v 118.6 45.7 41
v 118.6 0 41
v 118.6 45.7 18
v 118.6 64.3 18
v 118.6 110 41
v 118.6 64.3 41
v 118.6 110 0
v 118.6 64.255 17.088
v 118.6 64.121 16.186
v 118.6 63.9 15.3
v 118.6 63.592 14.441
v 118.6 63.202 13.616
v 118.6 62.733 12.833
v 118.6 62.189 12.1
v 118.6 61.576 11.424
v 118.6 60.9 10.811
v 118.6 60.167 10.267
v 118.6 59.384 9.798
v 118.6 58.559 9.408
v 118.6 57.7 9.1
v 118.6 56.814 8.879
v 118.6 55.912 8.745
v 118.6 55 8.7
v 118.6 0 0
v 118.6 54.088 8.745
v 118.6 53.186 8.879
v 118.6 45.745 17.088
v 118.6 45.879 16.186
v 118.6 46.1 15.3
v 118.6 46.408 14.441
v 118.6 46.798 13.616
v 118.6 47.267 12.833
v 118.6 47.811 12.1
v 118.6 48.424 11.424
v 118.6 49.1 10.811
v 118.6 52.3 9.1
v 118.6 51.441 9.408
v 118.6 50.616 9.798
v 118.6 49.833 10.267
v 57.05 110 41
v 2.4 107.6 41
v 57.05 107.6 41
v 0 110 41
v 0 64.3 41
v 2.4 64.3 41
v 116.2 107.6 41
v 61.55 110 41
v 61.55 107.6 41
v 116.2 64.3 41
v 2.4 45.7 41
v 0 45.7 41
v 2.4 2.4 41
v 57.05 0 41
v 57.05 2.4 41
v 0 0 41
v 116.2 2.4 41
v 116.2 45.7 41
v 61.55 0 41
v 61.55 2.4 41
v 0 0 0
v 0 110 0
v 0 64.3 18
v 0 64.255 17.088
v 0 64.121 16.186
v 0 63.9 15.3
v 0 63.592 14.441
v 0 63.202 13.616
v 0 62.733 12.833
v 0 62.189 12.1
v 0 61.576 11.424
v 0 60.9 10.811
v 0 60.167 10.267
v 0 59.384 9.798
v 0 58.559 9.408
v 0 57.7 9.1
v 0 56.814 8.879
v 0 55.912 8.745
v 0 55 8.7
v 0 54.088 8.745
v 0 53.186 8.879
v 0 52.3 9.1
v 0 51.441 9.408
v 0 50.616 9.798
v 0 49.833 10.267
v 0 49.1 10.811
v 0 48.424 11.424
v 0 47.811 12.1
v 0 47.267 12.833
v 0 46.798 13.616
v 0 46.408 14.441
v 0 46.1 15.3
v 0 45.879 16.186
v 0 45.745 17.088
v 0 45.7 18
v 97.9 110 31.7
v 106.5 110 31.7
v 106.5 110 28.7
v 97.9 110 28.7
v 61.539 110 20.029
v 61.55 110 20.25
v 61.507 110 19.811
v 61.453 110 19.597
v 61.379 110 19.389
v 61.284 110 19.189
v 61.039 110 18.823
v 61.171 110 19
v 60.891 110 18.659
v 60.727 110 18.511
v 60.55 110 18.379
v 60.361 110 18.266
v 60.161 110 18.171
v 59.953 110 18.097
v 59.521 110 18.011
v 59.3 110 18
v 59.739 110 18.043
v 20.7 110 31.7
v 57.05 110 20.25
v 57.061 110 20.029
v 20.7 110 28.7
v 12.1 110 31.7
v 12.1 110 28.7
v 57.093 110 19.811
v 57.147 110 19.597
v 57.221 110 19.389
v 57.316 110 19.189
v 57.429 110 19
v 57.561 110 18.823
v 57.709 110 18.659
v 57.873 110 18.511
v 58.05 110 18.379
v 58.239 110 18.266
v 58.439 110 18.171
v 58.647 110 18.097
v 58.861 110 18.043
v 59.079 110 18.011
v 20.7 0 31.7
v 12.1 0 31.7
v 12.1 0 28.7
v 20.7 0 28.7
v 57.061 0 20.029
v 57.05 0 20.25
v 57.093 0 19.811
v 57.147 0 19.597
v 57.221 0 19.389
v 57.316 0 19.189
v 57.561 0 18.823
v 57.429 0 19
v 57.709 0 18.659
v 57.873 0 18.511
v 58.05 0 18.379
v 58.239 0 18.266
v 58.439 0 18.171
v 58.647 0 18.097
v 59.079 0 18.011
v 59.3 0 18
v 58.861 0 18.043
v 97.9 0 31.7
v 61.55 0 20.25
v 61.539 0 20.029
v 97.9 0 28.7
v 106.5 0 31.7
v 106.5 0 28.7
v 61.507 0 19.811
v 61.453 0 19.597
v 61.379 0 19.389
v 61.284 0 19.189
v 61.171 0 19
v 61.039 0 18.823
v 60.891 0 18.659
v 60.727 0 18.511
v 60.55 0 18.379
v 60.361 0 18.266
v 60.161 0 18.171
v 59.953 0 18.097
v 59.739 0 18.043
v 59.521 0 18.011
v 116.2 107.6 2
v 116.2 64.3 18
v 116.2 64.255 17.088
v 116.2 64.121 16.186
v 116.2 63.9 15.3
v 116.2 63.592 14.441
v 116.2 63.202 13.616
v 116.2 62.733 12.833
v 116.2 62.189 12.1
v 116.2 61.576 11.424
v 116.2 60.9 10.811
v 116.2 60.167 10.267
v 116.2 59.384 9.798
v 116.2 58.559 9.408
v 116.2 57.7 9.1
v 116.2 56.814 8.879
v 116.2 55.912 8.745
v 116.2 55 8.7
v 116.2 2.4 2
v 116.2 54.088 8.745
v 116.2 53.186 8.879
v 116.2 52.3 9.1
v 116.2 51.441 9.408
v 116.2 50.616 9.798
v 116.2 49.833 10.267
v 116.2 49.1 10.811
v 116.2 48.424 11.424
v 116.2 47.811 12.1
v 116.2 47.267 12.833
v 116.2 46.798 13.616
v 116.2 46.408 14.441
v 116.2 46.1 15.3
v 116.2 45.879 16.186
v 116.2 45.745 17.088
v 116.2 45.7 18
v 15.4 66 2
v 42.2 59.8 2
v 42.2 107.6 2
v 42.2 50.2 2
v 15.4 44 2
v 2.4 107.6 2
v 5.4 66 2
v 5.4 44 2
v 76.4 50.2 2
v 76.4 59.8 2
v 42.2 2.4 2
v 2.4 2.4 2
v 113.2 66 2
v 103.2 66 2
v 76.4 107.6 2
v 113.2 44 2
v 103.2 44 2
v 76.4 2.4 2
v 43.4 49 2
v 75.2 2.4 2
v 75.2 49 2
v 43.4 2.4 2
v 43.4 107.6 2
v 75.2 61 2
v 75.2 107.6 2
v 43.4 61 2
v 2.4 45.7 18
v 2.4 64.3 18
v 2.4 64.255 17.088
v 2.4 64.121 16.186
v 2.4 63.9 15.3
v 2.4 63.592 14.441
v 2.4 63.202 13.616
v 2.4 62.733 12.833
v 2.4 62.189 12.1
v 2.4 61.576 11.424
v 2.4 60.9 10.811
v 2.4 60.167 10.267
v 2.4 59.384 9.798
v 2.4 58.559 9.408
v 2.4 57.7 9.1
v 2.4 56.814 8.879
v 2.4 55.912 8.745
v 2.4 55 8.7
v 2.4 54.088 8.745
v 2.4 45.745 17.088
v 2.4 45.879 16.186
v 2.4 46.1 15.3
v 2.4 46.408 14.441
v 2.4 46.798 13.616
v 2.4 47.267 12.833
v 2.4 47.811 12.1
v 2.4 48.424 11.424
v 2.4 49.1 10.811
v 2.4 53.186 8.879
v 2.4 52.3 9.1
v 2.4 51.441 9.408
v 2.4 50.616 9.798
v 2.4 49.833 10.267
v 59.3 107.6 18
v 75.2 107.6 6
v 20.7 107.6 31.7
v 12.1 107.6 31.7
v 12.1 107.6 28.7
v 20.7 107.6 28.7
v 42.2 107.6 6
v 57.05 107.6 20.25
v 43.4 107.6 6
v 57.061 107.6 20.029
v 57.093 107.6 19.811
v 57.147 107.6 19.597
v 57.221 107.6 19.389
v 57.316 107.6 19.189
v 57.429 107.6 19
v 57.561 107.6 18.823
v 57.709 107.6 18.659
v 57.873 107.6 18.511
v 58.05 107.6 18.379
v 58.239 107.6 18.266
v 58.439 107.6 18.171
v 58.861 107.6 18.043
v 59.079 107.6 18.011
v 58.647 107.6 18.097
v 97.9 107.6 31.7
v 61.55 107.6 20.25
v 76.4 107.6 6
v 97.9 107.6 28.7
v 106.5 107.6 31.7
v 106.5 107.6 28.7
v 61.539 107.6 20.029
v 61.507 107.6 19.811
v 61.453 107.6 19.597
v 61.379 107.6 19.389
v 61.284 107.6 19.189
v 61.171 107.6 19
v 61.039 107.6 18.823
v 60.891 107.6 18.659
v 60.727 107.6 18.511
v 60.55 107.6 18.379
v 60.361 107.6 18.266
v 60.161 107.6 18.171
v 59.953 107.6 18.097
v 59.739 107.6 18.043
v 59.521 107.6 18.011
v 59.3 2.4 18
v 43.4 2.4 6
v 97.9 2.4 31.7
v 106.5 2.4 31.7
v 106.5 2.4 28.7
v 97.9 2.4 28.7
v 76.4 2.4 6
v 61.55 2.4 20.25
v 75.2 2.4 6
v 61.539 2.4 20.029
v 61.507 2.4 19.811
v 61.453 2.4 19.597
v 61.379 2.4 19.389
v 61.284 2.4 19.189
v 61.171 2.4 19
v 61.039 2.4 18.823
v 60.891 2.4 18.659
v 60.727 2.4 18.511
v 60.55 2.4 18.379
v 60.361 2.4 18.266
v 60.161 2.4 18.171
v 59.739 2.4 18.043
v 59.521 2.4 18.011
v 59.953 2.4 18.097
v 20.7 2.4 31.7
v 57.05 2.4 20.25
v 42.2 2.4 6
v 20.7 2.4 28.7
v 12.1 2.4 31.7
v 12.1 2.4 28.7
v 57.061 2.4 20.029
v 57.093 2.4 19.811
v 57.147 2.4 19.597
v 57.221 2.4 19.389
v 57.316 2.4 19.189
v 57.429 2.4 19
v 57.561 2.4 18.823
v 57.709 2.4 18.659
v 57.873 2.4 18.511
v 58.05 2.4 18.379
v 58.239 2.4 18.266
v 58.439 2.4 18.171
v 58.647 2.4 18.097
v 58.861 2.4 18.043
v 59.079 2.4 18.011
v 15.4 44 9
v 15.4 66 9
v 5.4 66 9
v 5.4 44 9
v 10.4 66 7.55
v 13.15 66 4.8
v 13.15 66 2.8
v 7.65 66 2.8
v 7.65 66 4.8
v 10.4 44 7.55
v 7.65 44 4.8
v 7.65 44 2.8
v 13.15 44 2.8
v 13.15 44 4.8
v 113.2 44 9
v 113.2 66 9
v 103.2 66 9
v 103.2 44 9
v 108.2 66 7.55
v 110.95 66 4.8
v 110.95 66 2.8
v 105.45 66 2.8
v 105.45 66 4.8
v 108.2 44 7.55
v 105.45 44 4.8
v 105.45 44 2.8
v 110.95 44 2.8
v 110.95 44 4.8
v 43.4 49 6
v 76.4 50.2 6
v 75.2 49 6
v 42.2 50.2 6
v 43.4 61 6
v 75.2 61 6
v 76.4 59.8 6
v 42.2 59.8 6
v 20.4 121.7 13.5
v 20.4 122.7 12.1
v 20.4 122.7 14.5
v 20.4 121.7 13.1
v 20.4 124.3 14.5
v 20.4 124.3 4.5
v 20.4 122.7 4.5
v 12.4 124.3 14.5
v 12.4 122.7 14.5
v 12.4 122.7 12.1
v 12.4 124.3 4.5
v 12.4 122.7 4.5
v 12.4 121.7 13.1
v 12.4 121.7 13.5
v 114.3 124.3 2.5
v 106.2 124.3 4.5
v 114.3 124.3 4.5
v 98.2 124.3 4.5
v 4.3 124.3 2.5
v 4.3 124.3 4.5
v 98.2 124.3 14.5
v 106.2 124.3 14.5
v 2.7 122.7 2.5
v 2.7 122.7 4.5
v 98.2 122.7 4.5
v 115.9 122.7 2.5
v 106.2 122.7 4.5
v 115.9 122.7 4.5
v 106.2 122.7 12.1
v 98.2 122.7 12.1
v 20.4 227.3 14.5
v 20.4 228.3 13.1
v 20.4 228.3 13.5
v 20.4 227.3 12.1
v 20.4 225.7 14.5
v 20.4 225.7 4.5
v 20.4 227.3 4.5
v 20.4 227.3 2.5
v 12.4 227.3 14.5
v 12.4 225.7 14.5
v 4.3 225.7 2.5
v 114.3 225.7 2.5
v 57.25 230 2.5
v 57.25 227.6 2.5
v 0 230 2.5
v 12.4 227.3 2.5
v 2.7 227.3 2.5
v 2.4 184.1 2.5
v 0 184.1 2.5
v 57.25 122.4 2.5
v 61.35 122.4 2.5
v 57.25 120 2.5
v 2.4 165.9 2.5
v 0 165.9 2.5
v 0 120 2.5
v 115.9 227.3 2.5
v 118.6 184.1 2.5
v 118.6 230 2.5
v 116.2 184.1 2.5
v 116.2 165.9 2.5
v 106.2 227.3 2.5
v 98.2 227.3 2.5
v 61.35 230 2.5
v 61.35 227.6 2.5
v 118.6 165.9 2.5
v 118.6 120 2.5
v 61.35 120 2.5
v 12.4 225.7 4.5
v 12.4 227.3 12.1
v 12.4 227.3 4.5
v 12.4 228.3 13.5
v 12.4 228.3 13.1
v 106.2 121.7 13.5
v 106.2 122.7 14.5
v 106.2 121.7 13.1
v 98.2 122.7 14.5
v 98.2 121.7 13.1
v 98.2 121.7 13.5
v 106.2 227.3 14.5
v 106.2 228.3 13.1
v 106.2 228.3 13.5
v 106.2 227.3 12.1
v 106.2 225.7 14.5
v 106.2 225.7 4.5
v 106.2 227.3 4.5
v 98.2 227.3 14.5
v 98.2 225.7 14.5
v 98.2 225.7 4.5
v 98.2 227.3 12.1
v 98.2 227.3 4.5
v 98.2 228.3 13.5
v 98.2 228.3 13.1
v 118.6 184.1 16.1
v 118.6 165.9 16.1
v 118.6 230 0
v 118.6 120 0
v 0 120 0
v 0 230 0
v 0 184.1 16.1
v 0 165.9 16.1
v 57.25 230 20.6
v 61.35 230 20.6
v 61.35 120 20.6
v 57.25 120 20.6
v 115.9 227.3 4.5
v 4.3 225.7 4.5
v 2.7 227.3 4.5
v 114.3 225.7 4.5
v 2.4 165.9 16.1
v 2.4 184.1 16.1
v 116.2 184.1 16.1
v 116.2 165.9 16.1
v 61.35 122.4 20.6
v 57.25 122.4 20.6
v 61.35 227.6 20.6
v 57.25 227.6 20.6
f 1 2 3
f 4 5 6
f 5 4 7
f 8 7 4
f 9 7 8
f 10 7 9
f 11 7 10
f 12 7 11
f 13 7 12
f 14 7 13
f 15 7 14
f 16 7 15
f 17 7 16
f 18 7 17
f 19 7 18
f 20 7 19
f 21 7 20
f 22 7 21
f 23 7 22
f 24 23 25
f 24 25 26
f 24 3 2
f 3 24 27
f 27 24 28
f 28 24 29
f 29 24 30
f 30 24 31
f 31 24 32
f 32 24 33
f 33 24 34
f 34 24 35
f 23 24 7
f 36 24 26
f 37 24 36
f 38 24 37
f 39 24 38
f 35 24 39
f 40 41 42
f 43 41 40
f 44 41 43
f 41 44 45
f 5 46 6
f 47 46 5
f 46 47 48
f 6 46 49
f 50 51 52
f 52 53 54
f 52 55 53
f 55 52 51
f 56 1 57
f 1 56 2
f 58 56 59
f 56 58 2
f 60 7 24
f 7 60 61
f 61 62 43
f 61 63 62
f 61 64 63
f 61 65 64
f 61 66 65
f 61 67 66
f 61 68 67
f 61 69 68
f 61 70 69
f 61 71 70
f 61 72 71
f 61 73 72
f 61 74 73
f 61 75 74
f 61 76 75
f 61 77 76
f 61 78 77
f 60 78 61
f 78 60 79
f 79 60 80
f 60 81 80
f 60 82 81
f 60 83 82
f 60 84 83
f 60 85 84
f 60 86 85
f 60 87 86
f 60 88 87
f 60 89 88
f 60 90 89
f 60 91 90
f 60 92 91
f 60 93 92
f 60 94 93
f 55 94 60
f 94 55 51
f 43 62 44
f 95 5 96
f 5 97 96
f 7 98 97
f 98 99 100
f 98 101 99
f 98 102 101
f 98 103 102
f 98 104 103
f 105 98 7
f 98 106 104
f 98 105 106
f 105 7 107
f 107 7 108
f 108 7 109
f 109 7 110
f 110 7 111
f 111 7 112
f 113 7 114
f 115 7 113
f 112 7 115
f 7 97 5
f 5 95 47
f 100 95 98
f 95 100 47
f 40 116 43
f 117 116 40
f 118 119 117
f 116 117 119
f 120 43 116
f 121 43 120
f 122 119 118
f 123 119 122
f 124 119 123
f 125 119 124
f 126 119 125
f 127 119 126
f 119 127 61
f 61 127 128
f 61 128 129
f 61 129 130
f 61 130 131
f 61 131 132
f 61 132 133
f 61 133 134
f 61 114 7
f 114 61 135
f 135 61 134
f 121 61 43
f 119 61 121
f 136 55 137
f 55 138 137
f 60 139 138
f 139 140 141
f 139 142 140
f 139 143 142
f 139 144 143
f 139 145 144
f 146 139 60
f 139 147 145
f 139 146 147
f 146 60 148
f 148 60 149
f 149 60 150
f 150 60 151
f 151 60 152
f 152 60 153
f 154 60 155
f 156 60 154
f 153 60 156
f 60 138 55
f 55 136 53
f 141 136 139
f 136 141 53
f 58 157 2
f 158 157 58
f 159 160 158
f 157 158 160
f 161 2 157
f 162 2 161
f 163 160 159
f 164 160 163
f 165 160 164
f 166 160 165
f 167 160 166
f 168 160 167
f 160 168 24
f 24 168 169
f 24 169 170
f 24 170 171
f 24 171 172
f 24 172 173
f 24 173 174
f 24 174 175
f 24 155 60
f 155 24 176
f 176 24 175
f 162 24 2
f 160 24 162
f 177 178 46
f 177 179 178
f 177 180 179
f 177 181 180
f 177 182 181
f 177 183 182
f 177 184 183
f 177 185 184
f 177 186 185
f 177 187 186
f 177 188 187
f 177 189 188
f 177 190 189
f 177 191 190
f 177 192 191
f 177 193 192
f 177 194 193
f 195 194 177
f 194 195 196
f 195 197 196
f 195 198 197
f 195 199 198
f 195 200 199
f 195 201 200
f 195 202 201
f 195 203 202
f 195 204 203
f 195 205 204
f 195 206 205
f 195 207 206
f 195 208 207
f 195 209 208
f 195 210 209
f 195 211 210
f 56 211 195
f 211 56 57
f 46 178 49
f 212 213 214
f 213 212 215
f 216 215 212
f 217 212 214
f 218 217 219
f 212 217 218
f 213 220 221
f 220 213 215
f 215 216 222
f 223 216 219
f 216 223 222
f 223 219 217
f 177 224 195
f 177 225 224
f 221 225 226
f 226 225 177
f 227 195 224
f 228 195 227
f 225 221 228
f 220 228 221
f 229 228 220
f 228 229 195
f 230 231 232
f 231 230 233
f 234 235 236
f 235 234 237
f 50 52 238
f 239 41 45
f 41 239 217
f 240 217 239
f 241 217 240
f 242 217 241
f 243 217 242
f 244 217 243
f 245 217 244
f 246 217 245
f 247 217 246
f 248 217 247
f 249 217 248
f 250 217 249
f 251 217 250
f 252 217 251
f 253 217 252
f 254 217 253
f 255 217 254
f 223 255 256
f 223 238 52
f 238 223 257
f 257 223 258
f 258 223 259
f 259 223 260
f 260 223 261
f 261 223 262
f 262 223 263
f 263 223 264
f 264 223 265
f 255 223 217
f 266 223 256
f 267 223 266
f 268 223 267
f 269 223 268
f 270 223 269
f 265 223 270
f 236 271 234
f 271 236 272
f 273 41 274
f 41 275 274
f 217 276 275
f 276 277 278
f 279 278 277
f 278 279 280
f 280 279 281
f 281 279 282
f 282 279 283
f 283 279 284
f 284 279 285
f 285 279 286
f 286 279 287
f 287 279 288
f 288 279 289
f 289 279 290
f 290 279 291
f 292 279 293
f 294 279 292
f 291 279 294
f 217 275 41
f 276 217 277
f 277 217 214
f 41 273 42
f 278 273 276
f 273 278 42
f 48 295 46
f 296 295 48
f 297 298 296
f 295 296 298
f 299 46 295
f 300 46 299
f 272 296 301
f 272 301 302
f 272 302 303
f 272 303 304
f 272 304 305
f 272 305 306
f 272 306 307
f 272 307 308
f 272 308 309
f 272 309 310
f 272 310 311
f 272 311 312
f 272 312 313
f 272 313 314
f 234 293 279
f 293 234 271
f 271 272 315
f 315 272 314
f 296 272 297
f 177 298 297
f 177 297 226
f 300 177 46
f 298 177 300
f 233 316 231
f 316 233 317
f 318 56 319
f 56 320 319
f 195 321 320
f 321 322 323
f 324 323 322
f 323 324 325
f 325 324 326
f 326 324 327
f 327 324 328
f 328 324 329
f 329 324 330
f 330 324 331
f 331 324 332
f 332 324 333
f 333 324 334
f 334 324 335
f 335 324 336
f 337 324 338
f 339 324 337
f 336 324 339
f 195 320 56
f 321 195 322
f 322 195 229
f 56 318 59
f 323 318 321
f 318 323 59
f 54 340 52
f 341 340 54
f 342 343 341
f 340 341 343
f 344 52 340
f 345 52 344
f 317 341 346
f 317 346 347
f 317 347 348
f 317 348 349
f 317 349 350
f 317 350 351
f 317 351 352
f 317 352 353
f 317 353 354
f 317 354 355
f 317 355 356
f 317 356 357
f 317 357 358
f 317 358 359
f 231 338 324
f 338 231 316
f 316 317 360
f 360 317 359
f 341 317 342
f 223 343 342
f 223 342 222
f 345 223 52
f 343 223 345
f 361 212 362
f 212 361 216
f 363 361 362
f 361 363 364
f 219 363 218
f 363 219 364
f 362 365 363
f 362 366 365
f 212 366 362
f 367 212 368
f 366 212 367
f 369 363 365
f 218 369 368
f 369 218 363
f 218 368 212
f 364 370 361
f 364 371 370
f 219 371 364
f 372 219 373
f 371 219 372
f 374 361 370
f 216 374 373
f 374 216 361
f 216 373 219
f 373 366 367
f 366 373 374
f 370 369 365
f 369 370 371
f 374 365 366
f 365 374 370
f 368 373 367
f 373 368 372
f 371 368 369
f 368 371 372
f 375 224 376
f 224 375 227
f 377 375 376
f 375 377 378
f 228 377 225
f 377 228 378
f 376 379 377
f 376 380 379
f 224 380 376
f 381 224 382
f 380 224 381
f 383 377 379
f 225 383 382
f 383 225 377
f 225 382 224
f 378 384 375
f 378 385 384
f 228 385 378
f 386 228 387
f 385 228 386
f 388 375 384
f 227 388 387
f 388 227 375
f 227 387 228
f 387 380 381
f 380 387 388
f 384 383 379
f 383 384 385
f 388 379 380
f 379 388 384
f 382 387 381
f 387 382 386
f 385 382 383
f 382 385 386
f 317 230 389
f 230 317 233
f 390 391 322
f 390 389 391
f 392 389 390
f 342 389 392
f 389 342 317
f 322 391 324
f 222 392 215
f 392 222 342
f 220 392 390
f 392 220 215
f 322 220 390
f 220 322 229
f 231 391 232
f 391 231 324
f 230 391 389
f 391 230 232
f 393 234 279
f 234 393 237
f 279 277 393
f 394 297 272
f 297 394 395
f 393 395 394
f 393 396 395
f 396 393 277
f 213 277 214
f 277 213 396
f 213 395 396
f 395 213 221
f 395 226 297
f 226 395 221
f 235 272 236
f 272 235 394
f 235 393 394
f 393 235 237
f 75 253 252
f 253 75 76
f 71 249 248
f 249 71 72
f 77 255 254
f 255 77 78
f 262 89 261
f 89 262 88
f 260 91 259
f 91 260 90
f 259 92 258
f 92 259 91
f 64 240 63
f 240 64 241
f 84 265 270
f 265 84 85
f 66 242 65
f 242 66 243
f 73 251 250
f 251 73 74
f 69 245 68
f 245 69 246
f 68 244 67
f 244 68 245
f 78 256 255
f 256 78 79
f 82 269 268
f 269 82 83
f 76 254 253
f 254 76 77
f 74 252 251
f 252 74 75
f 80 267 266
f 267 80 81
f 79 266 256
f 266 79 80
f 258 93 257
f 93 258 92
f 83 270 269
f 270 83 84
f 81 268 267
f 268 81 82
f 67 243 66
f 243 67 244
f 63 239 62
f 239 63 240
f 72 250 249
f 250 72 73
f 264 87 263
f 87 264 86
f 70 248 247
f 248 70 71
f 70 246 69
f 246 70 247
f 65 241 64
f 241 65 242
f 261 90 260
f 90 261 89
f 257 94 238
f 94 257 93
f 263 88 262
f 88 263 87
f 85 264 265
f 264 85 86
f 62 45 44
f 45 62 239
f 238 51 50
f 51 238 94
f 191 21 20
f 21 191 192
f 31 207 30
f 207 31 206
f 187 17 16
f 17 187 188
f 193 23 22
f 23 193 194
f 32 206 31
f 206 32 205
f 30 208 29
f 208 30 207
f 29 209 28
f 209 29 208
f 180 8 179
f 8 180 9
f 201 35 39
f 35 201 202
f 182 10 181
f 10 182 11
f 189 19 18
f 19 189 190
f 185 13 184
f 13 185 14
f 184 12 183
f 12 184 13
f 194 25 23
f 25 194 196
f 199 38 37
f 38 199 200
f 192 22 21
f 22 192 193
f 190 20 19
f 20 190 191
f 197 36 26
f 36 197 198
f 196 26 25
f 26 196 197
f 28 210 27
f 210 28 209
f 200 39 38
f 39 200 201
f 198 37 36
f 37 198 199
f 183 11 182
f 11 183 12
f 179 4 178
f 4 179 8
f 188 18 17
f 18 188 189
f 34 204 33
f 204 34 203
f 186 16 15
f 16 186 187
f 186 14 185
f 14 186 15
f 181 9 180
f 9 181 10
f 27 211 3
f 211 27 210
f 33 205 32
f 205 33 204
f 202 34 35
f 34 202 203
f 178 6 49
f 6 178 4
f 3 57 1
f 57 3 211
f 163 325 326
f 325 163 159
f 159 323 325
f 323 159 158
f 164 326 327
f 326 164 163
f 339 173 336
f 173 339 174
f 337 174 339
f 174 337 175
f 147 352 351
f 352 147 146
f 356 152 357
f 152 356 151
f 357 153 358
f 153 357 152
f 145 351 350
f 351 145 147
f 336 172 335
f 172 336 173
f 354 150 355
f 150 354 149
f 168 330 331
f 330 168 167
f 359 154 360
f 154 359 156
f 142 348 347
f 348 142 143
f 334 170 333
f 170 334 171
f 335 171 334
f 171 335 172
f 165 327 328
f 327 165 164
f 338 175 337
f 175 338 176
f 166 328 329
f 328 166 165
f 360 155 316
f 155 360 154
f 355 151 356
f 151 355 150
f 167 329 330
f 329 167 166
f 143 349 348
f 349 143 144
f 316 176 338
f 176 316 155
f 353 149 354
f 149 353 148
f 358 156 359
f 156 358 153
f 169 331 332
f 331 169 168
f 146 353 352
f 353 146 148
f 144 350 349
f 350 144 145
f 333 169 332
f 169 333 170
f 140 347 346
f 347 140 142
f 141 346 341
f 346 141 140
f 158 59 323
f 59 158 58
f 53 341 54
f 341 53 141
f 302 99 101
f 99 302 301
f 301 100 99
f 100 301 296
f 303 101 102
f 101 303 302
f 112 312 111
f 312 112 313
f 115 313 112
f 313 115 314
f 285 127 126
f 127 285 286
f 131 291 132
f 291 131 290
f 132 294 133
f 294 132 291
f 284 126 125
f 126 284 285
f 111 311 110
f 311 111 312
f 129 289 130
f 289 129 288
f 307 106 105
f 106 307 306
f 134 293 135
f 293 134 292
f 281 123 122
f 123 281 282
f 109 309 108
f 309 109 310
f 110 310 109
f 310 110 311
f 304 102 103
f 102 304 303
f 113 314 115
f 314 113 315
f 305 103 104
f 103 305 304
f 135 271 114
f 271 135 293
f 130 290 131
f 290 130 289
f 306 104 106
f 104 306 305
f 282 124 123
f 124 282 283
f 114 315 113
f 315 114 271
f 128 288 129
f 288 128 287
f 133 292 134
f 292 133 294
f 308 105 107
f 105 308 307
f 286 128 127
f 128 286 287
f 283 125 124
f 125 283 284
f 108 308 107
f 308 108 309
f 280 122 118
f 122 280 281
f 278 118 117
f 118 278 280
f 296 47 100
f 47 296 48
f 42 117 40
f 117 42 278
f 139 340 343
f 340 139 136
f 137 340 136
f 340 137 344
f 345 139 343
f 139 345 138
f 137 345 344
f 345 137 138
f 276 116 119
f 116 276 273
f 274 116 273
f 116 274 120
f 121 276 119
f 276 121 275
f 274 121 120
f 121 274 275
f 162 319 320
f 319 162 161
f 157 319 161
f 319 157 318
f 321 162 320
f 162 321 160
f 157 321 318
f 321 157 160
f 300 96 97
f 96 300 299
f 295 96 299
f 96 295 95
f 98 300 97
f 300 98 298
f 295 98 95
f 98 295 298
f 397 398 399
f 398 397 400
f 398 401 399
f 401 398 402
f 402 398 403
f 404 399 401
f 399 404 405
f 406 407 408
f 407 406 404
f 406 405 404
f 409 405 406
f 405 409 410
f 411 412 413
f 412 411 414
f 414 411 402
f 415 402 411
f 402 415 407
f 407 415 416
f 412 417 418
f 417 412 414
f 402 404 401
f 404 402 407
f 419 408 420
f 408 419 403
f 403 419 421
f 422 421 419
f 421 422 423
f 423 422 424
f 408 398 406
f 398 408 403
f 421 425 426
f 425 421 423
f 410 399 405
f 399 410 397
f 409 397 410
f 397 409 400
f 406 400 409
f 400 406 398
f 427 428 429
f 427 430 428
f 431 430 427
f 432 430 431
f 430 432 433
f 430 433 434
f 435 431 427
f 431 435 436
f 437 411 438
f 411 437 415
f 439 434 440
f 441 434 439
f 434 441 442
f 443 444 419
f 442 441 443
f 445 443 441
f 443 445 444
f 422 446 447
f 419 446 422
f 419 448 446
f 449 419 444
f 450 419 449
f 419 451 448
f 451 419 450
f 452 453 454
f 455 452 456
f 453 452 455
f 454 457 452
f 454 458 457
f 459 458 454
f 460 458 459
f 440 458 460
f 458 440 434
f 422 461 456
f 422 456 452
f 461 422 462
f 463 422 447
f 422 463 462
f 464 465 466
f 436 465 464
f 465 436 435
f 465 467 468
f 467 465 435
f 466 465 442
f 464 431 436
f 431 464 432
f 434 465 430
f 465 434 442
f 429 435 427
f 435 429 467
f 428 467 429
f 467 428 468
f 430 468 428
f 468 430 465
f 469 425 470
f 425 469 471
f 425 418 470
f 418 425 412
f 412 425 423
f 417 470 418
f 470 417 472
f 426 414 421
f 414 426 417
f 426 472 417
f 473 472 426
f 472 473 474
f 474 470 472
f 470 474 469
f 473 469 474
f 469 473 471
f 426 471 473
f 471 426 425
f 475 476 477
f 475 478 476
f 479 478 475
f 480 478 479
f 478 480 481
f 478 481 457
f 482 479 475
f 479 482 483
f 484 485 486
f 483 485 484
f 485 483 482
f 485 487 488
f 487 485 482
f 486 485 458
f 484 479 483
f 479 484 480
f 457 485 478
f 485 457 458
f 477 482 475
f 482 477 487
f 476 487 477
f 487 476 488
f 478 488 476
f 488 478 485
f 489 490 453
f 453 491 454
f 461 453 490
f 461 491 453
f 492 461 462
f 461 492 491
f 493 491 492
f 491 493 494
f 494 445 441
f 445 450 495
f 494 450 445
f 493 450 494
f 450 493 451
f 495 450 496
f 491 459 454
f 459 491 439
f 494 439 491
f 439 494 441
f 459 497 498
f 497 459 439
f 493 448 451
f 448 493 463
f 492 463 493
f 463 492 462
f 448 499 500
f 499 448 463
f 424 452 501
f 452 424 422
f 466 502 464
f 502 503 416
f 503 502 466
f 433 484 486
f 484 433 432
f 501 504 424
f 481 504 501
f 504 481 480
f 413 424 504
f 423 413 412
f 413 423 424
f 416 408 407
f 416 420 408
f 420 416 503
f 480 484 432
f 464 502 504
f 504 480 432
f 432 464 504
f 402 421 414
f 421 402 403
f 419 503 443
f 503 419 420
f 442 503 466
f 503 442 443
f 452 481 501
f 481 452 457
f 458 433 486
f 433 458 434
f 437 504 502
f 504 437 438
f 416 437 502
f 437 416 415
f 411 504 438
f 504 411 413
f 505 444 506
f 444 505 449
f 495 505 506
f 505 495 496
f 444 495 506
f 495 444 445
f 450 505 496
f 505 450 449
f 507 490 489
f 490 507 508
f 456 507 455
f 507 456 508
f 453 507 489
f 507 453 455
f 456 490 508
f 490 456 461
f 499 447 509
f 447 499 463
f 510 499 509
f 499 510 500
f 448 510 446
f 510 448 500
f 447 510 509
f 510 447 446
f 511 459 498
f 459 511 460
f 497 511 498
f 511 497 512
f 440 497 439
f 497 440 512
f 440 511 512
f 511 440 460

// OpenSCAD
// =====================================================================
//  CT clamp box for a 10 AWG x 4C cord  —  companion to wago_junction_box
//
//  The cord passes straight through, unbroken.  Inside the box the outer
//  jacket is stripped and the two hot conductors each run through their
//  own Zemismart SDM02T-TZ split-core CT.  The CTs lie on their sides,
//  side by side across Y, lead faces against the back and front walls,
//  jaws facing the centre lane (hinge up).  Neutral + ground run down the
//  lane between the CTs.  CT leads exit through U-slots in the outer walls.
//
//  Units: mm.  Print base + lid.  PETG or ASA/ABS — NOT PLA.
//  Snap-fit lid (press the barbs in from outside to release).
//  Set  part = "base" / "lid" / "both"  then F6 + export STL.
// =====================================================================

/* [Cord] */
cord_od     = 18.0;   // measured with calipers (10/4 STW, 5 mm conductors)
cord_clear  = 0.6;    // extra on slot width

/* [CT clamps — Zemismart SDM02T-TZ 120 A split-core (drawing: 35.5 W x 45.6 H x 30.8 D, window D16)] */
ct_w       = 35.5;  // body width  -> box HEIGHT when lying on its side
ct_h       = 45.6;  // body height (lead face to jaw) -> along Y
ct_d       = 30.8;  // body depth (window axis) -> along X, conductor runs through
ct_fit     = 0.5;   // per-side pocket clearance
ct_lead_d  = 4.5;   // twin-lead OD (measured ~4 mm)
ct_lead_z  = ct_w/2;// lead exits the centre of the lead face
ct_win_y   = 12;    // window centre from the jaw end (from the drawing)
ct_lane    = 12;    // lane between the two CTs for neutral + ground
ct_top_clr = 2.5;   // headroom above the CT under the lid
fence_h    = 4.0;
fence_t    = 1.2;

/* [Box] */
wall      = 2.4;
floor_t   = 2.0;
lid_t     = 2.5;
lip_t     = 1.6;
lip_h     = 2.0;
lip_clear = 0.3;
fan_out   = 28;    // saddle -> CT: room for the hots to jog into their windows

/* [Strain relief — zip-tie saddle] */
saddle_h = 7;      // must clear tie_z + tie_h + tie_w/2 (peaked roof) by >= 1.2
saddle_x = 10;
tie_w    = 5.5;    // zip-tie tunnel width (fits a 4.8 mm tie)
tie_h    = 2.0;    // tunnel height at the straight walls; a 45 deg peak sits on top (no bridge)
tie_z    = 0.8;    // tunnel floor above saddle base

/* [Snap-fit (PETG-sized)] */
snap_n    = 2;     // hooks per long (X) side
snap_w    = 8;     // hook width (X)
snap_edge = 14;    // hook centre distance from each end wall
arm_len   = 12;    // arm length below lid underside (longer = softer snap)
barb_d    = 1.0;   // barb protrusion into the wall window
barb_h    = 2.4;   // barb height (45 deg chamfers top and bottom for printing)
win_clear = 0.3;   // window clearance around the barb, per side

/* [Output] */
part = "both"; // ["base","lid","both"]

// ---------------- derived ----------------
ct_px   = ct_d + 2*ct_fit;                 // pocket size along X
ct_py   = ct_h + 2*ct_fit;                 // pocket size along Y
inner_x = 2*(3 + saddle_x + fan_out) + ct_px;
inner_y = 2*ct_py + ct_lane;
inner_h = ct_w + 2*ct_fit + ct_top_clr;
outer_x = inner_x + 2*wall;
outer_y = inner_y + 2*wall;
rim_z   = floor_t + inner_h;
slot_w  = cord_od + cord_clear;
cord_y  = wall + inner_y/2;
cord_zb = floor_t + saddle_h;              // cord bottom
cord_zc = cord_zb + cord_od/2;             // cord centre
cord_zt = cord_zb + cord_od;               // cord top
tab_w   = slot_w - 0.4;
tab_h   = rim_z - (cord_zt + 0.4);
ct_x0   = wall + 3 + saddle_x + fan_out;   // pocket X start (fence inside face)
ct_xc   = ct_x0 + ct_px/2;                 // CT / lead-slot X centre
ct_lead_zb = floor_t + ct_fit + ct_lead_z - ct_lead_d/2;   // lead slot bottom
lead_tab_w = ct_lead_d - 0.4;
lead_tab_h = rim_z - (ct_lead_zb + ct_lead_d + 0.4);
snap_xs = [for (i=[0:snap_n-1]) wall + snap_edge + i*(outer_x - 2*(wall+snap_edge))/max(snap_n-1,1)];
$fn = 64;

module cord_slot() {                    // U-slot in the x=0 end wall, open to the top
    translate([-1, cord_y, cord_zc]) rotate([0,90,0]) cylinder(d=slot_w, h=wall+2);
    translate([-1, cord_y-slot_w/2, cord_zc]) cube([wall+2, slot_w, rim_z]);
}

module lead_slot() {                    // U-slot in the y=0 wall, centred on x=0, open to the top
    translate([0, -1, ct_lead_zb + ct_lead_d/2]) rotate([-90,0,0]) cylinder(d=ct_lead_d, h=wall+2);
    translate([-ct_lead_d/2, -1, ct_lead_zb + ct_lead_d/2]) cube([ct_lead_d, wall+2, rim_z]);
}

module saddle(x0) {
    // block with a Y-axis tunnel under the deck for a zip tie;
    // tunnel has a 45 deg peaked roof so it prints with no bridge
    sw = cord_od + 4;
    tx = (saddle_x - tie_w)/2;
    translate([x0, cord_y - sw/2, floor_t]) difference() {
        cube([saddle_x, sw, saddle_h]);
        translate([0, sw+1, 0]) rotate([90,0,0]) linear_extrude(sw+2)
            polygon([[tx, tie_z], [tx+tie_w, tie_z], [tx+tie_w, tie_z+tie_h],
                     [tx+tie_w/2, tie_z+tie_h+tie_w/2], [tx, tie_z+tie_h]]);
    }
}

// CT pocket against the y=0 wall: two side fences + a front fence (wall closes the back)
module ct_pocket() {
    translate([ct_x0-fence_t, wall, floor_t])        cube([fence_t, ct_py+fence_t, fence_h]);
    translate([ct_x0+ct_px,   wall, floor_t])        cube([fence_t, ct_py+fence_t, fence_h]);
    translate([ct_x0-fence_t, wall+ct_py, floor_t])  cube([ct_px+2*fence_t, fence_t, fence_h]);
}

module snap_windows() {
    ww = snap_w + 2*win_clear;
    wh = barb_h + 2*win_clear;
    z0 = rim_z - arm_len - win_clear;       // barb occupies the bottom barb_h of the arm
    for (x=snap_xs, y=[-1, outer_y - wall - 1])
        translate([x - ww/2, y, z0]) cube([ww, wall+2, wh]);
}

// One hook, lid print orientation, on the y=0 side; barb points toward -Y (into the wall).
module snap_hook() {
    li = wall + lip_clear;
    zt = lid_t + arm_len;
    translate([-snap_w/2, 0, 0]) {
        translate([0, li, lid_t]) cube([snap_w, lip_t, arm_len]);
        rotate([90,0,90]) linear_extrude(snap_w)
            polygon([[li, zt - barb_h], [li - barb_d, zt - barb_h + barb_d],
                     [li - barb_d, zt - barb_d], [li, zt], [li + 0.01, zt], [li + 0.01, zt - barb_h]]);
    }
}

module base() {
    difference() {
        union() {
            // shell
            difference() {
                cube([outer_x, outer_y, rim_z]);
                translate([wall, wall, floor_t]) cube([inner_x, inner_y, inner_h+1]);
            }
            // zip-tie saddles
            saddle(wall + 3);
            saddle(outer_x - wall - 3 - saddle_x);
            // CT pockets, mirrored about the box centreline
            ct_pocket();
            translate([0, outer_y, 0]) mirror([0,1,0]) ct_pocket();
        }
        // cord entries
        cord_slot();
        translate([outer_x - wall, 0, 0]) cord_slot();
        // CT lead slots through the back and front walls
        translate([ct_xc, 0, 0]) lead_slot();
        translate([ct_xc, outer_y, 0]) mirror([0,1,0]) lead_slot();
        // snap windows through both long walls
        snap_windows();
    }
}

module lid() {   // modelled in PRINT orientation: plate on bed, lip/tabs/hooks up
    li = wall + lip_clear;
    union() {
        cube([outer_x, outer_y, lid_t]);
        // continuous alignment lip
        translate([li, li, lid_t])                     cube([outer_x-2*li, lip_t, lip_h]);
        translate([li, outer_y-li-lip_t, lid_t])       cube([outer_x-2*li, lip_t, lip_h]);
        translate([li, li, lid_t])                     cube([lip_t, outer_y-2*li, lip_h]);
        translate([outer_x-li-lip_t, li, lid_t])       cube([lip_t, outer_y-2*li, lip_h]);
        // tabs that drop into the cord slots and sit just above the cord
        translate([0,            cord_y-tab_w/2, lid_t]) cube([wall, tab_w, tab_h]);
        translate([outer_x-wall, cord_y-tab_w/2, lid_t]) cube([wall, tab_w, tab_h]);
        // tabs that close the CT lead slots above the lead
        translate([ct_xc-lead_tab_w/2, 0,            lid_t]) cube([lead_tab_w, wall, lead_tab_h]);
        translate([ct_xc-lead_tab_w/2, outer_y-wall, lid_t]) cube([lead_tab_w, wall, lead_tab_h]);
        // snap hooks on both long sides
        for (x=snap_xs) {
            translate([x, 0, 0]) snap_hook();
            translate([x, outer_y, 0]) mirror([0,1,0]) snap_hook();
        }
    }
}

if (part == "base" || part == "both") base();
if (part == "lid"  || part == "both") translate([0, outer_y + 10, 0]) lid();

echo(str("CT box: ", outer_x, " x ", outer_y, " mm; base height ", rim_z, " mm; lid ", lid_t + max(lip_h, tab_h, arm_len, lead_tab_h),
         " mm; inner ", inner_x, " x ", inner_y, " x ", inner_h,
         "; CT windows at y=", wall + ct_fit + ct_h - ct_win_y, " and ", outer_y - (wall + ct_fit + ct_h - ct_win_y),
         ", z=", floor_t + ct_fit + ct_w/2, "; cord centre y=", cord_y, " z=", cord_zc));
